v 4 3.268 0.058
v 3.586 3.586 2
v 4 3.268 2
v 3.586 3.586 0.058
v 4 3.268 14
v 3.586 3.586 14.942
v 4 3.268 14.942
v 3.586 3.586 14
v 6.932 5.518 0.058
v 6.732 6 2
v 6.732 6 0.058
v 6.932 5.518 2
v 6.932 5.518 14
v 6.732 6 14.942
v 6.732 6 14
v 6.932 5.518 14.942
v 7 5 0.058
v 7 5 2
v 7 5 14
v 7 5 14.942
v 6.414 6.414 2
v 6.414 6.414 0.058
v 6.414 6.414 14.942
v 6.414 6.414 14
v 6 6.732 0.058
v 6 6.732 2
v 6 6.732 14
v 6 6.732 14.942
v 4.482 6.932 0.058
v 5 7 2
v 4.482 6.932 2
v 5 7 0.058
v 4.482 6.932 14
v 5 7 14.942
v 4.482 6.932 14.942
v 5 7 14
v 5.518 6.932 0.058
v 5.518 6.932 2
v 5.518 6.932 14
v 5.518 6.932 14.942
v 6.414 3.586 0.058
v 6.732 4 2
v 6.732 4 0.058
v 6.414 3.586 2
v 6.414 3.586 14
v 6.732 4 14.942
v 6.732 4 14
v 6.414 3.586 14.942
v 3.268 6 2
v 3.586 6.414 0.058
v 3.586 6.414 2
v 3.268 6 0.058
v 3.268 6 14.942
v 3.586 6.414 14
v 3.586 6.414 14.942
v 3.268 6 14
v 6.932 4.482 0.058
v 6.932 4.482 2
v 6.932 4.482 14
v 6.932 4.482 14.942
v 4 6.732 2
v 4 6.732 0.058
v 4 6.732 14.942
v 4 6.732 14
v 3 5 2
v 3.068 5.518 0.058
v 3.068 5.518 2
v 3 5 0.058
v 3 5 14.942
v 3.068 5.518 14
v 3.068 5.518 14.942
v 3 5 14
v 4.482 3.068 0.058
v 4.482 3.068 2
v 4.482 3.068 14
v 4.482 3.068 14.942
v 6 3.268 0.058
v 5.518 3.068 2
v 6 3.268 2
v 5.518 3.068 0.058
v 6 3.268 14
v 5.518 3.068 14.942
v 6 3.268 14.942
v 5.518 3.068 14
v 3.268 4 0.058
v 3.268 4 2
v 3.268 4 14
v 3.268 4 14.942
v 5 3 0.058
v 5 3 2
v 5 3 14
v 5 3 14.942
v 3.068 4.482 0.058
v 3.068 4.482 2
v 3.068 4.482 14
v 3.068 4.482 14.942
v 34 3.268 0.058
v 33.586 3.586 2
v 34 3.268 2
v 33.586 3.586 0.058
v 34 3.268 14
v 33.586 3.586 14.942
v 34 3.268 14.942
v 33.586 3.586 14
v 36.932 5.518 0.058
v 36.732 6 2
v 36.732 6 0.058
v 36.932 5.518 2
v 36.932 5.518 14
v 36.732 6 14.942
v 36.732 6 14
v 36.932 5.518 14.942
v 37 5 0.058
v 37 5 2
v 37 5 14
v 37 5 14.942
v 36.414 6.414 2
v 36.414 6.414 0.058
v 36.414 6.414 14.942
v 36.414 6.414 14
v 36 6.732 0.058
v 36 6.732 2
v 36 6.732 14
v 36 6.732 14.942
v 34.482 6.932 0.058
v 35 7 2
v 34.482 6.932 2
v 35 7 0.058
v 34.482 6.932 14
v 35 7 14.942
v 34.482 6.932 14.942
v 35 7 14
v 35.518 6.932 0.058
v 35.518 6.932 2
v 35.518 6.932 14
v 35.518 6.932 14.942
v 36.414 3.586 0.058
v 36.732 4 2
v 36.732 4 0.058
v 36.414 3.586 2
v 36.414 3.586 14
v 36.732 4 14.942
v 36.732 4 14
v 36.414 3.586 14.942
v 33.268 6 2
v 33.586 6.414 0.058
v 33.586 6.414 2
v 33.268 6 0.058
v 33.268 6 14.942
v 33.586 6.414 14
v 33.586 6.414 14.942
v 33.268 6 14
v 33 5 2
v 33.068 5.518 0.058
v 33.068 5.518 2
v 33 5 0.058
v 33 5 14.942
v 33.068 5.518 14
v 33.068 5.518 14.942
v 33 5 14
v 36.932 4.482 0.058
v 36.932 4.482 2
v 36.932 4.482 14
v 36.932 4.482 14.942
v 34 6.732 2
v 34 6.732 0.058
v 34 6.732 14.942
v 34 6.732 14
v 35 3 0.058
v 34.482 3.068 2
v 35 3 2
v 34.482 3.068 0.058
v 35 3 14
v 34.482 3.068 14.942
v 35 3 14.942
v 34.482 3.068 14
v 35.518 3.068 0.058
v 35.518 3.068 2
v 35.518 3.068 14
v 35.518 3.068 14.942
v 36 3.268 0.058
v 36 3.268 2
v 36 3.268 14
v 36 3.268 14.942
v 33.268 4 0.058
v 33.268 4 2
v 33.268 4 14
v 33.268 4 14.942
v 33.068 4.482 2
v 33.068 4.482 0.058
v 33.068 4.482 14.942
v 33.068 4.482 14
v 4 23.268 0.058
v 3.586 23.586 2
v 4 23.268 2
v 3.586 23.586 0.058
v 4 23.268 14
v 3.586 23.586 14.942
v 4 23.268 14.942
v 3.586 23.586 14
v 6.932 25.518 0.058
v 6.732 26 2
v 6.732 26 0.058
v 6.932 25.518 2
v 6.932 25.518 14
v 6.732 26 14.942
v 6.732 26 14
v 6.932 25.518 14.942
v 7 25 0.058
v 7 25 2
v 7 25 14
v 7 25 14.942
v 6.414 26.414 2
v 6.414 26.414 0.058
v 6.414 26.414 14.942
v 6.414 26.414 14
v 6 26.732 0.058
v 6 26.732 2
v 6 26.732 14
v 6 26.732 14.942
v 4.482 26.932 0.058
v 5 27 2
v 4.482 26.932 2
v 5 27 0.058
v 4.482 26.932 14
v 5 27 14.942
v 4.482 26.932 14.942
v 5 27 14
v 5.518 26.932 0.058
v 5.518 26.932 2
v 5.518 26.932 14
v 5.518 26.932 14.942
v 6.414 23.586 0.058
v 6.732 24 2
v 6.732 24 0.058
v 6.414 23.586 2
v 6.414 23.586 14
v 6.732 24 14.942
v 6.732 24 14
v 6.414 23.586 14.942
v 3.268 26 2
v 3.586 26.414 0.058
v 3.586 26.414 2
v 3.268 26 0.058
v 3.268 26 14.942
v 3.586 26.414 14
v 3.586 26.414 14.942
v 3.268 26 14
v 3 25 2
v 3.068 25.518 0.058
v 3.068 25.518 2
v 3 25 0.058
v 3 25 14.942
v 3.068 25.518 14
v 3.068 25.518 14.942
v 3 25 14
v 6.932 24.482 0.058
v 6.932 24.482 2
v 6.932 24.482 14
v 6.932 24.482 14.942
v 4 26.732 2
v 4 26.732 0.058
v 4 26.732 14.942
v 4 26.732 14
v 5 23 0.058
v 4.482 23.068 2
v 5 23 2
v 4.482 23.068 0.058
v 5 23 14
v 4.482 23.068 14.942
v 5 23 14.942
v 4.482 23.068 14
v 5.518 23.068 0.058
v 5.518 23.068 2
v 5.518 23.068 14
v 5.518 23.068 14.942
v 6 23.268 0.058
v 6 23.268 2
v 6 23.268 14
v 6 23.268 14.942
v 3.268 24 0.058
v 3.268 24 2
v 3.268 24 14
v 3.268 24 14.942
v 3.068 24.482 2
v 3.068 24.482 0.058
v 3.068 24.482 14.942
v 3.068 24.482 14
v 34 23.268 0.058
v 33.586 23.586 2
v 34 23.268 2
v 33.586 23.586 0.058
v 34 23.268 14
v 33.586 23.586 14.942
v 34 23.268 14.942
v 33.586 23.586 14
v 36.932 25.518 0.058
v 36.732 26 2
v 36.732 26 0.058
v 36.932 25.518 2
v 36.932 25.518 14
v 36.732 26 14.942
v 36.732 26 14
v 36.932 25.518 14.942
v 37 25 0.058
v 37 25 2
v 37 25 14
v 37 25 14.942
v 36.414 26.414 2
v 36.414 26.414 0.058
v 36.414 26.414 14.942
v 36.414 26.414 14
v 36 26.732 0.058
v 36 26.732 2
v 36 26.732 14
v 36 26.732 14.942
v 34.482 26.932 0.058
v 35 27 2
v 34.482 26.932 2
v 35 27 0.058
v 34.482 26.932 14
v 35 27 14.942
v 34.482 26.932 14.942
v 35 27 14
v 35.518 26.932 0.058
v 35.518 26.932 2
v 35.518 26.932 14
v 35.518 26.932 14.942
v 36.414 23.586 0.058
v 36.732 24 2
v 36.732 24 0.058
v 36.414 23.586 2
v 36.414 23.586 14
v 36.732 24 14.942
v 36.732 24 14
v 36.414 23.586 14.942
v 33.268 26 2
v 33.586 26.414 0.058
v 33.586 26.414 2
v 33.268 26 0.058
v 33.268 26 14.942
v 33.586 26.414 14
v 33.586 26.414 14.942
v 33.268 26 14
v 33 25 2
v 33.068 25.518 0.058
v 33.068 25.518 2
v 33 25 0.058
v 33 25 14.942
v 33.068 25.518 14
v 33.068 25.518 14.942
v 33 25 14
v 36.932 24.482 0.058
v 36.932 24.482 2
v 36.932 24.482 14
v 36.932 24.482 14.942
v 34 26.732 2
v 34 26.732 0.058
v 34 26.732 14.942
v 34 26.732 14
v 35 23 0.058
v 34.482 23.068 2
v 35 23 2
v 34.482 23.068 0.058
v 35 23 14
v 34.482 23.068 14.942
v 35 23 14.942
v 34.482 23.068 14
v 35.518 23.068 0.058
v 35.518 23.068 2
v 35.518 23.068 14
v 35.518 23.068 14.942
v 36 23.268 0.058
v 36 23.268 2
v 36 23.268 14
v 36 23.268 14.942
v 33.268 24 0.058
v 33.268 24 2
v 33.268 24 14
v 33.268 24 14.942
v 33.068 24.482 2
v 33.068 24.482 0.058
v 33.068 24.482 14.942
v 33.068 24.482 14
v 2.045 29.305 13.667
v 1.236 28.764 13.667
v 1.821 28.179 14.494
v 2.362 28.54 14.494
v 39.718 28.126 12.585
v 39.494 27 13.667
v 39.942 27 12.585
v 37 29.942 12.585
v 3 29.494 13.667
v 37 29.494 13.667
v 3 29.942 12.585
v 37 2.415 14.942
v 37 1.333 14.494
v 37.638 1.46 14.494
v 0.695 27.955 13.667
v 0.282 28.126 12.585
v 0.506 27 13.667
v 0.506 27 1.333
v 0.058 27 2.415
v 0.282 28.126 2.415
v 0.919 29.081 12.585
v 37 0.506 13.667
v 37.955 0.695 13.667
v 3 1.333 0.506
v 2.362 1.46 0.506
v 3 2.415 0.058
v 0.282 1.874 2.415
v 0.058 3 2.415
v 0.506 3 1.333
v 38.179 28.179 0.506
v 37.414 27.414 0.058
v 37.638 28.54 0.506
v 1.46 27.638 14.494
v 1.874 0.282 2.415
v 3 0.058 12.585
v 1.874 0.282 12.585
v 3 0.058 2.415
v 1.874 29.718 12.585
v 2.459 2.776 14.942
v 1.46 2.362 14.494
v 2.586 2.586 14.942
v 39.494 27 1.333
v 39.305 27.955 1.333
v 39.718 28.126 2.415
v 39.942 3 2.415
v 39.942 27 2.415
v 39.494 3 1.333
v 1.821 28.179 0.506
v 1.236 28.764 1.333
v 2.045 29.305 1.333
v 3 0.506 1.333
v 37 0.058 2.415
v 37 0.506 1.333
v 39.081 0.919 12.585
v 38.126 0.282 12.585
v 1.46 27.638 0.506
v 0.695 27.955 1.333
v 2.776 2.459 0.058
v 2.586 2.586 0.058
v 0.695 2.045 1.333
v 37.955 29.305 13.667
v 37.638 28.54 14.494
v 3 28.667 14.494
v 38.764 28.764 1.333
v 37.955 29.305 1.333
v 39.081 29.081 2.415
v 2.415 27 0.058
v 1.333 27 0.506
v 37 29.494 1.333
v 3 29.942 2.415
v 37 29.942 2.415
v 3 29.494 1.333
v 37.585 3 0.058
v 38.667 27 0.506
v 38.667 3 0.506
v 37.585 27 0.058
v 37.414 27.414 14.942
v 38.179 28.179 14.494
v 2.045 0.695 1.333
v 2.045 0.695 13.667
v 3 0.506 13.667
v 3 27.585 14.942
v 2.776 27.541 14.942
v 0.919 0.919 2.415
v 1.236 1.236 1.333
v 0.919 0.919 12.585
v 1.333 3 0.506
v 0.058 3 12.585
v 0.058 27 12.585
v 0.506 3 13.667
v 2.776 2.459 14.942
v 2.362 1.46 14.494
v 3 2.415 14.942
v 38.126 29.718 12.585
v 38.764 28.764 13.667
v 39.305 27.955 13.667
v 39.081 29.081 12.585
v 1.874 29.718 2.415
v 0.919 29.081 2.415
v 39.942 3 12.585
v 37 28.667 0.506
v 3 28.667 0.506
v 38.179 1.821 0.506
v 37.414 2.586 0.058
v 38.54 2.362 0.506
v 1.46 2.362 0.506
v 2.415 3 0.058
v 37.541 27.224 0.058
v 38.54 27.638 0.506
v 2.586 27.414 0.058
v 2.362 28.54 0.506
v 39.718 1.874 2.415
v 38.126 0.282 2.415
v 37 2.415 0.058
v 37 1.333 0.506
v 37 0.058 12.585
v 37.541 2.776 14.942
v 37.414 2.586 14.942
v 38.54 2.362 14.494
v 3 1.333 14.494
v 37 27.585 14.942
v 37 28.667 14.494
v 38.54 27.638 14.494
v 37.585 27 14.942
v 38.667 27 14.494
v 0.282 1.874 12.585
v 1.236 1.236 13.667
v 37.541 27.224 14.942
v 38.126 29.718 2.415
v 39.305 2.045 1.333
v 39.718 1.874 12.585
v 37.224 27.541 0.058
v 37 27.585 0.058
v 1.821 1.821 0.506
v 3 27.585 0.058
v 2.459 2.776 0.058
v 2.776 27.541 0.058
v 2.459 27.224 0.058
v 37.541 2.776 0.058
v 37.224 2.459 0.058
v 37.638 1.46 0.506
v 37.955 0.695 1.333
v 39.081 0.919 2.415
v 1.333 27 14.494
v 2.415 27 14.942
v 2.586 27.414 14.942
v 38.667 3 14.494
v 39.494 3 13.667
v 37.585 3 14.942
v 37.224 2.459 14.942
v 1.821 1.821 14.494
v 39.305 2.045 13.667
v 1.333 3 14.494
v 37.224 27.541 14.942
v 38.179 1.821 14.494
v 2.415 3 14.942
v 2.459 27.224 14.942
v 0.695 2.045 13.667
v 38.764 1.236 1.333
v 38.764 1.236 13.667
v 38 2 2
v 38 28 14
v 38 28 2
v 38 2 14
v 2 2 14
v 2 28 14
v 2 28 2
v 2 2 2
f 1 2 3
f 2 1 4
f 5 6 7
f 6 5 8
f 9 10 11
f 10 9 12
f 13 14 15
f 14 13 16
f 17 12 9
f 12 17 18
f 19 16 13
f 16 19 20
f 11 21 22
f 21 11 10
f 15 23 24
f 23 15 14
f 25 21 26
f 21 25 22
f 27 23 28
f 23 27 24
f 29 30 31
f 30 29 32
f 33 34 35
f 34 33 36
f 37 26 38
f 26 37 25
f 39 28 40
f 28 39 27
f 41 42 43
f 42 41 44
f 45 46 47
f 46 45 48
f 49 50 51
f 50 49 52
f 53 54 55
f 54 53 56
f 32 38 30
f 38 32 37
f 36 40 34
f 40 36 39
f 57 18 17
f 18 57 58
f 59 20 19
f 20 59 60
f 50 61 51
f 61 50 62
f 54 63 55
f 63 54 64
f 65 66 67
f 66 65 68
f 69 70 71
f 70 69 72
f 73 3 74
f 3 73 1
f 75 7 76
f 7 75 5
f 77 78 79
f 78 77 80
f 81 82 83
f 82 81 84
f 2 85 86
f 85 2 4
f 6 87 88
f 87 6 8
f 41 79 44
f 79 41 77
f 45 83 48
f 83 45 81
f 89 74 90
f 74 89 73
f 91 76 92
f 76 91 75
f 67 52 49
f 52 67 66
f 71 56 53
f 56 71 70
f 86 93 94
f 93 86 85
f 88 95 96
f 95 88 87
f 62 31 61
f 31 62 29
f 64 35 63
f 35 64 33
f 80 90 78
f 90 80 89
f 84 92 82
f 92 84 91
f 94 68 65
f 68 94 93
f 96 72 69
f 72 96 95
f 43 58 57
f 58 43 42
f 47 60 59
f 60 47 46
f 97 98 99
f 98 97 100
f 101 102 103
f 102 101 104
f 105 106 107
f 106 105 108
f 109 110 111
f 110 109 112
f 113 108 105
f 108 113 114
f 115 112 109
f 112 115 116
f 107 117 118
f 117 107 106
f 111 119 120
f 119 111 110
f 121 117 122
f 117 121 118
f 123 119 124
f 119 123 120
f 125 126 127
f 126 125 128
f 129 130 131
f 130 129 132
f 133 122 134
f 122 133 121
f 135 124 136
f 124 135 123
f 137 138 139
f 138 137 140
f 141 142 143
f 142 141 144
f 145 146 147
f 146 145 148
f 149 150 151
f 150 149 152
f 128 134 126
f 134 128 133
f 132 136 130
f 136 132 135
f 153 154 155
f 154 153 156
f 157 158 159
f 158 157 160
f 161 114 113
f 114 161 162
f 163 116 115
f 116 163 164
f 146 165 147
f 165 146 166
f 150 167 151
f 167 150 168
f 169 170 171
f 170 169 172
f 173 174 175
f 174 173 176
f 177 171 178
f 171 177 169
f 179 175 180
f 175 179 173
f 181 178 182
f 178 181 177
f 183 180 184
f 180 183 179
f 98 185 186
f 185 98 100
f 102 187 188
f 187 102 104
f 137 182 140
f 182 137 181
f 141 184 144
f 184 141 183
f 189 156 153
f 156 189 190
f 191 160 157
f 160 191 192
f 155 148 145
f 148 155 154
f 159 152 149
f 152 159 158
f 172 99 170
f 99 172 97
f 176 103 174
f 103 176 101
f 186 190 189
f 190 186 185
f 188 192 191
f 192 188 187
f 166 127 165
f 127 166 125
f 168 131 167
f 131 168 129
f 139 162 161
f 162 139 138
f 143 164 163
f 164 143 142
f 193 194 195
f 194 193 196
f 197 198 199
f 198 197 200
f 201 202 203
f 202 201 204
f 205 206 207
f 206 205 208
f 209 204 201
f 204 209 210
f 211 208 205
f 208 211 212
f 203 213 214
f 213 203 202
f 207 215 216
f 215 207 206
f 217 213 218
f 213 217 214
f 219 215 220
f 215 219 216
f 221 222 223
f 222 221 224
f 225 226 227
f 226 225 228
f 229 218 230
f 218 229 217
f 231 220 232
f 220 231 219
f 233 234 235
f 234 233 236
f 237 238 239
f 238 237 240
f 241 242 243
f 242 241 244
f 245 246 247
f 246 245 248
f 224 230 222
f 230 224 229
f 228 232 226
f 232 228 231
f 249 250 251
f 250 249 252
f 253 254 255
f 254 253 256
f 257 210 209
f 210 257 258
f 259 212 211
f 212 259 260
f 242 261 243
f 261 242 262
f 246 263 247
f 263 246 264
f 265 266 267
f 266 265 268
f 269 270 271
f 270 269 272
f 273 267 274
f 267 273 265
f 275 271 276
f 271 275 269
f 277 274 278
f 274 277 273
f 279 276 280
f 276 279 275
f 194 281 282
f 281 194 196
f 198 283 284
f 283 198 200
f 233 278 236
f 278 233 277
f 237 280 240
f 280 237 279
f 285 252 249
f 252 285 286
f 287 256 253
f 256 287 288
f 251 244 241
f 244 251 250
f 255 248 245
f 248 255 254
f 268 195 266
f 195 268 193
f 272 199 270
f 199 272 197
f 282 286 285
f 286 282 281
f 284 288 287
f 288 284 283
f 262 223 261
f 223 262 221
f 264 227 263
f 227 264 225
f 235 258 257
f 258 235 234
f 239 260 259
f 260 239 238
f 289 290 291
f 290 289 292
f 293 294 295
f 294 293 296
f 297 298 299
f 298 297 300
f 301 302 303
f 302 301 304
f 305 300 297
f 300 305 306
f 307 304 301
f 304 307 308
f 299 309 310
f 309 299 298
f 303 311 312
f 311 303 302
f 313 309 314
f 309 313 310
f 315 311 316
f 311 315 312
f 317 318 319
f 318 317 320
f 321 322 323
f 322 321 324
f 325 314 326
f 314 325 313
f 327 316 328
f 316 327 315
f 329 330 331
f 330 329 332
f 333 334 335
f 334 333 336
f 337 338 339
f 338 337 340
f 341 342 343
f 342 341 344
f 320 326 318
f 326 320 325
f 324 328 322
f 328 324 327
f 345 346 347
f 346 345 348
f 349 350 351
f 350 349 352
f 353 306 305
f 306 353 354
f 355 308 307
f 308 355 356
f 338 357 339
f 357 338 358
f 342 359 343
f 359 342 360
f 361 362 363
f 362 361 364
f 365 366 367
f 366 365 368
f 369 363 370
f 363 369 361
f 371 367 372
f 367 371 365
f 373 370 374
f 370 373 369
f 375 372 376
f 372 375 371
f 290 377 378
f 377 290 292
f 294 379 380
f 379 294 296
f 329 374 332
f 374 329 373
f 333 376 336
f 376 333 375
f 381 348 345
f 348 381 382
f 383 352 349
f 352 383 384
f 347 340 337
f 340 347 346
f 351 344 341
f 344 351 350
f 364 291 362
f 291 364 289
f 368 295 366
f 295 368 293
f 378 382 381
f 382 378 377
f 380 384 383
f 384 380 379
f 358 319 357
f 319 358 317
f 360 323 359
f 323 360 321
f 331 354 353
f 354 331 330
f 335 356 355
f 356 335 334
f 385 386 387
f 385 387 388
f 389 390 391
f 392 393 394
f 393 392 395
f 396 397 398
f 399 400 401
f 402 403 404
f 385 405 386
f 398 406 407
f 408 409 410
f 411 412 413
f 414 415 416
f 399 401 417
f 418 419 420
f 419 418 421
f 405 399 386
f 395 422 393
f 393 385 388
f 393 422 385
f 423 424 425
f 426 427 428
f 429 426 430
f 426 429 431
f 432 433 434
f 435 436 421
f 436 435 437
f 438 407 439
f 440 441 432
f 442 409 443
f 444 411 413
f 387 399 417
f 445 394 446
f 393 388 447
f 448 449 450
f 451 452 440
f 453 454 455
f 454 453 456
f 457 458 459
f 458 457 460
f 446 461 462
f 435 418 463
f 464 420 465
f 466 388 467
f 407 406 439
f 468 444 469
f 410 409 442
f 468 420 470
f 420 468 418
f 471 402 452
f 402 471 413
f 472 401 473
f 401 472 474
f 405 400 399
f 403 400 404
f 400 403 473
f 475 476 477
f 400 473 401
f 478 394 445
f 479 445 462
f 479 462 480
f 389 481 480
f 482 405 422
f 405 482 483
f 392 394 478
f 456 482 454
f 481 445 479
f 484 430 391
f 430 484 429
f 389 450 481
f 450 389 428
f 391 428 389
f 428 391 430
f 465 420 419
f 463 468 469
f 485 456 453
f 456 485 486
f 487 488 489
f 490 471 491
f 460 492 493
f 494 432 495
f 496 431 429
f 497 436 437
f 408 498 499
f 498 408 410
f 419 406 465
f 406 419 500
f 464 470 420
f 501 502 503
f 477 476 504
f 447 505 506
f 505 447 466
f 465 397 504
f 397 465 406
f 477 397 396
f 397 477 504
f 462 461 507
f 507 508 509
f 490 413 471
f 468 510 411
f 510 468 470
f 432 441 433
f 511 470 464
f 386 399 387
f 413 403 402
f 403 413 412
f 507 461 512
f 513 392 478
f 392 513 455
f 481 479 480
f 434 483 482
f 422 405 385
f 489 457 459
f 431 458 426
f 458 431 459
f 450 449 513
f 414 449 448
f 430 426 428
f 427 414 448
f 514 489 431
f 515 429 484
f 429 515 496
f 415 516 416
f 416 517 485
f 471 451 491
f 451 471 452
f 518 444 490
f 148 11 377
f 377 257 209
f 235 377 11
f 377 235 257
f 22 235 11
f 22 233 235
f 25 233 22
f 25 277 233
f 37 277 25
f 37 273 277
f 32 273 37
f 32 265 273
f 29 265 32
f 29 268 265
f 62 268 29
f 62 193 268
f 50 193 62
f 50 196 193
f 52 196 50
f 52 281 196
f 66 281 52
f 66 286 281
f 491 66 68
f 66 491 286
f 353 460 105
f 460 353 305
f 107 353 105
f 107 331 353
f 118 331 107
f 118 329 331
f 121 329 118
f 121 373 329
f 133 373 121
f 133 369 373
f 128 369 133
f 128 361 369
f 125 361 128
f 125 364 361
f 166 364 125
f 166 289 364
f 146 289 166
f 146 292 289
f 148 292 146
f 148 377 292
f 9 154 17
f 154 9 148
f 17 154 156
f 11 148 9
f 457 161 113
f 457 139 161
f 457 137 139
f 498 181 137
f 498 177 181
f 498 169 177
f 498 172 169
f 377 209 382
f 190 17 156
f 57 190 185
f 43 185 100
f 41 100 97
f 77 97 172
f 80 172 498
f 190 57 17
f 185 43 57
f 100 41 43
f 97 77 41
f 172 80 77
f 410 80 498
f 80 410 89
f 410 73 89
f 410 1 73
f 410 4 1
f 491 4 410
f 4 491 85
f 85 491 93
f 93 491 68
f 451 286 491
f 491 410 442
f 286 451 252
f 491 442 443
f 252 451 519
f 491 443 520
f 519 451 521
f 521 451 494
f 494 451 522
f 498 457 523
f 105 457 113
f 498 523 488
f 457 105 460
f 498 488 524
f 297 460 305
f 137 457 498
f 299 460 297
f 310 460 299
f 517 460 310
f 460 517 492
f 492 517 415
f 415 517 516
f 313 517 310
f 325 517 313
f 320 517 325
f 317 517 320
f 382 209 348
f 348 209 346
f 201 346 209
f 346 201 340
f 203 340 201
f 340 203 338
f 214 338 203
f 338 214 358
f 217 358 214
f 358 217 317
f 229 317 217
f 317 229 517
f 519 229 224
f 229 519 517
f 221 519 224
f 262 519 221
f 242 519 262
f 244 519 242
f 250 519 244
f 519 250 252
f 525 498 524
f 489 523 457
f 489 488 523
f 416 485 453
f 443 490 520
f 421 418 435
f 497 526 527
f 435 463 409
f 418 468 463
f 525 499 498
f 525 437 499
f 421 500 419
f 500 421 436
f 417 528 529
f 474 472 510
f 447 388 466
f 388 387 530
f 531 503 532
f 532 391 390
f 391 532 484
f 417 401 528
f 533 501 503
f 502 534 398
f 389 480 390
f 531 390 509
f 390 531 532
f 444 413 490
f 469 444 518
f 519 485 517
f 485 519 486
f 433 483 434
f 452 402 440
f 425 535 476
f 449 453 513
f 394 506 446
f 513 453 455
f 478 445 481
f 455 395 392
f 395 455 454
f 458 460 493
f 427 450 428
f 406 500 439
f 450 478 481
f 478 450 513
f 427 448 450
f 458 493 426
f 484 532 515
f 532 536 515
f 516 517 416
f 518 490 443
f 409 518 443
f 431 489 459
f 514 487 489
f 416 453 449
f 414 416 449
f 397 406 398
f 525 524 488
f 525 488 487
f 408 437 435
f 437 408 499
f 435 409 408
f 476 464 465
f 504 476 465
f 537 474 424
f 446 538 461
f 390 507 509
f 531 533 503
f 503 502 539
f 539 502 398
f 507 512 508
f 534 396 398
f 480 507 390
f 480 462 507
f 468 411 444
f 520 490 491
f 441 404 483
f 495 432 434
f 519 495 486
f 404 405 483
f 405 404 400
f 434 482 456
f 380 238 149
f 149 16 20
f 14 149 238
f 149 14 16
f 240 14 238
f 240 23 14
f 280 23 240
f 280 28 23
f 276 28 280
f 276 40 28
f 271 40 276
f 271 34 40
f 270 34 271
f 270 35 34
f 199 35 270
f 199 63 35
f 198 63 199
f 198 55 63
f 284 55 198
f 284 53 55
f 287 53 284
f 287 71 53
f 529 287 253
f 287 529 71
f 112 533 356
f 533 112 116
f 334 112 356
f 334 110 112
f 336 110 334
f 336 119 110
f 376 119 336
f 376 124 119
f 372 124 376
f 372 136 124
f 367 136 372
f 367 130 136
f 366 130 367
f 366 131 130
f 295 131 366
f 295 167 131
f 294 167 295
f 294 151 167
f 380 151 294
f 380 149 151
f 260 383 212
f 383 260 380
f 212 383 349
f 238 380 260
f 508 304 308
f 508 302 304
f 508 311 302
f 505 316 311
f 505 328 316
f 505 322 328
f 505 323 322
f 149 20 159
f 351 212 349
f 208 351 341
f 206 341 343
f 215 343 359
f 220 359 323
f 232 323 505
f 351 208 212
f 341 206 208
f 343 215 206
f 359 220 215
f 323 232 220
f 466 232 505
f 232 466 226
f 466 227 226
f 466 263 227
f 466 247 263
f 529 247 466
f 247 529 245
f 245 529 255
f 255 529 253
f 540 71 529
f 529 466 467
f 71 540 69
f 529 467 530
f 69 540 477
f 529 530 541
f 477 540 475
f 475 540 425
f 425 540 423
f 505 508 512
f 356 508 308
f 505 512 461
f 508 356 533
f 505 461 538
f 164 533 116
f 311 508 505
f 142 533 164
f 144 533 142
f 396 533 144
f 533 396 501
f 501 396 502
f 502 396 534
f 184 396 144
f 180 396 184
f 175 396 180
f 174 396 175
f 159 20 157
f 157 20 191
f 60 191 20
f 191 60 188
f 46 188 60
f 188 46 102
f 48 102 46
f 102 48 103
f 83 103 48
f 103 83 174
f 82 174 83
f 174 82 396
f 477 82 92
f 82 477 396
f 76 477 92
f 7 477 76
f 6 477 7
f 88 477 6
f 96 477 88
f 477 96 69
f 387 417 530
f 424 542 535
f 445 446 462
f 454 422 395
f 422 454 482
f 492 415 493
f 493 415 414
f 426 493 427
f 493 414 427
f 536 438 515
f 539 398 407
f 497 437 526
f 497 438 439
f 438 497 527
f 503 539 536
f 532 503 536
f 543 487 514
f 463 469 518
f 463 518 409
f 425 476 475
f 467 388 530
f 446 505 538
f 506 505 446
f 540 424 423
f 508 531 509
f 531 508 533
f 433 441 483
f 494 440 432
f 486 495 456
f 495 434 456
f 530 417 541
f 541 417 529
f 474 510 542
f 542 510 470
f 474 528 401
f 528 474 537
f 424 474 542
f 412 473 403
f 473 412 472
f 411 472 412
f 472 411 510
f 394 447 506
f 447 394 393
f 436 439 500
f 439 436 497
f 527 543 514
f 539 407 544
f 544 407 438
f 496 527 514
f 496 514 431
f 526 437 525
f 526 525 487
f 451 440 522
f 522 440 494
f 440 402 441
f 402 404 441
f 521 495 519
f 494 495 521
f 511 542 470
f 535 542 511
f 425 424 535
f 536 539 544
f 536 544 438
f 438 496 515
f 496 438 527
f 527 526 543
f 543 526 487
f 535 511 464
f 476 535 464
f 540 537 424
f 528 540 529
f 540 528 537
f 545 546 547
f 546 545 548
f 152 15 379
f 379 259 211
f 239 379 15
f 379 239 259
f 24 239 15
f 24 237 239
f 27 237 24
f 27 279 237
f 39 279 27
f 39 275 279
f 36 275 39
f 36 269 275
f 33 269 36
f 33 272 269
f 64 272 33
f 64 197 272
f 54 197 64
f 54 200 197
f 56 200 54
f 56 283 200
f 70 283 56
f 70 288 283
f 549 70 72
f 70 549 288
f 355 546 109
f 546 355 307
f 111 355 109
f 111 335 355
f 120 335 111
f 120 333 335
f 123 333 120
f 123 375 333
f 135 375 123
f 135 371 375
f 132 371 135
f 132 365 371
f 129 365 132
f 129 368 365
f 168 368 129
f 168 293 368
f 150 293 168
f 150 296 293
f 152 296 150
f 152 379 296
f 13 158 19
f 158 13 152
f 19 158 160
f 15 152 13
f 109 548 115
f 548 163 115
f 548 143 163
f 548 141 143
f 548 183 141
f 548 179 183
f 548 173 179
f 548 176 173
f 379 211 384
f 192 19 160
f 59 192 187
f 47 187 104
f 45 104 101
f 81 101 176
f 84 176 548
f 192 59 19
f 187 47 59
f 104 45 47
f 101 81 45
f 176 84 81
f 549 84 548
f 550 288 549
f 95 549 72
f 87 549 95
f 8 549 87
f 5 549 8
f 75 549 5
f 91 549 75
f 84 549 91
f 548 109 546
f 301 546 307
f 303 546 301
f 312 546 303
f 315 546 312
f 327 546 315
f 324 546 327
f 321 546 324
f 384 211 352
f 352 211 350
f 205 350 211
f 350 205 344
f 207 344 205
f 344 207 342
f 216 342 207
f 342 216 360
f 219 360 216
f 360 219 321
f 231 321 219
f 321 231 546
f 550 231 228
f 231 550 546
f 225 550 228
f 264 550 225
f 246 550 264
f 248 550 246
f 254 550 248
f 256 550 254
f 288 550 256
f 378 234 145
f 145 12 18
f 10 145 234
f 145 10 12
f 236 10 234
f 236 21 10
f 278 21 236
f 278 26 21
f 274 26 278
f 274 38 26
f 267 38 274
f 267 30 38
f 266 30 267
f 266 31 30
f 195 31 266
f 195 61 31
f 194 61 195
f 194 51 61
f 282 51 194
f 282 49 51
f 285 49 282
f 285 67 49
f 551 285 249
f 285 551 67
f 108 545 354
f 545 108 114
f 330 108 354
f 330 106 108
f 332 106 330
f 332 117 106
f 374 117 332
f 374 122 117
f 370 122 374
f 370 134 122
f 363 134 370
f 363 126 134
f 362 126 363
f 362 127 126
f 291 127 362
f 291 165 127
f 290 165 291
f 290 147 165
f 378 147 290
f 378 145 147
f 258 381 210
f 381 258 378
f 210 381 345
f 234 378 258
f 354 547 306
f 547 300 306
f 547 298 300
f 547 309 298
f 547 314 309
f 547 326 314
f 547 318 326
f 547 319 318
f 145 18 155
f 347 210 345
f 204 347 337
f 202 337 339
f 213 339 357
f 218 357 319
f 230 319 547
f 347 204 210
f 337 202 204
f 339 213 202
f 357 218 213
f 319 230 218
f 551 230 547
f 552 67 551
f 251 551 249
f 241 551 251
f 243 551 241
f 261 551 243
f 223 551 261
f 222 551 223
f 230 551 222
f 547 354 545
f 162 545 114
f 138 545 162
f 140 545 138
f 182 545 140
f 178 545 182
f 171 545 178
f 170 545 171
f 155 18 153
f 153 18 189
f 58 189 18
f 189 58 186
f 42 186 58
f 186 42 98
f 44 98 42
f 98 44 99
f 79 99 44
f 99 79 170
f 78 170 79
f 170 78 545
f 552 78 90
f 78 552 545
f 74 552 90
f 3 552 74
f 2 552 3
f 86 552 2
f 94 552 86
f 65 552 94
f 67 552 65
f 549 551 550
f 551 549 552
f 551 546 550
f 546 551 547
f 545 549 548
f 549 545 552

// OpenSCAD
// A more complex model to test rendering performance
module rounded_box(size, radius) {
    hull() {
        for (x = [radius, size.x - radius])
            for (y = [radius, size.y - radius])
                for (z = [radius, size.z - radius])
                    translate([x, y, z])
                        sphere(r = radius, $fn = 16);
    }
}

module mounting_hole(depth) {
    cylinder(r = 2, h = depth + 1, $fn = 24);
}

difference() {
    rounded_box([40, 30, 15], 3);

    // Hollow interior
    translate([2, 2, 2])
        cube([36, 26, 12]);

    // Mounting holes
    for (pos = [[5, 5, -1], [35, 5, -1], [5, 25, -1], [35, 25, -1]])
        translate(pos)
            mounting_hole(15);
}
